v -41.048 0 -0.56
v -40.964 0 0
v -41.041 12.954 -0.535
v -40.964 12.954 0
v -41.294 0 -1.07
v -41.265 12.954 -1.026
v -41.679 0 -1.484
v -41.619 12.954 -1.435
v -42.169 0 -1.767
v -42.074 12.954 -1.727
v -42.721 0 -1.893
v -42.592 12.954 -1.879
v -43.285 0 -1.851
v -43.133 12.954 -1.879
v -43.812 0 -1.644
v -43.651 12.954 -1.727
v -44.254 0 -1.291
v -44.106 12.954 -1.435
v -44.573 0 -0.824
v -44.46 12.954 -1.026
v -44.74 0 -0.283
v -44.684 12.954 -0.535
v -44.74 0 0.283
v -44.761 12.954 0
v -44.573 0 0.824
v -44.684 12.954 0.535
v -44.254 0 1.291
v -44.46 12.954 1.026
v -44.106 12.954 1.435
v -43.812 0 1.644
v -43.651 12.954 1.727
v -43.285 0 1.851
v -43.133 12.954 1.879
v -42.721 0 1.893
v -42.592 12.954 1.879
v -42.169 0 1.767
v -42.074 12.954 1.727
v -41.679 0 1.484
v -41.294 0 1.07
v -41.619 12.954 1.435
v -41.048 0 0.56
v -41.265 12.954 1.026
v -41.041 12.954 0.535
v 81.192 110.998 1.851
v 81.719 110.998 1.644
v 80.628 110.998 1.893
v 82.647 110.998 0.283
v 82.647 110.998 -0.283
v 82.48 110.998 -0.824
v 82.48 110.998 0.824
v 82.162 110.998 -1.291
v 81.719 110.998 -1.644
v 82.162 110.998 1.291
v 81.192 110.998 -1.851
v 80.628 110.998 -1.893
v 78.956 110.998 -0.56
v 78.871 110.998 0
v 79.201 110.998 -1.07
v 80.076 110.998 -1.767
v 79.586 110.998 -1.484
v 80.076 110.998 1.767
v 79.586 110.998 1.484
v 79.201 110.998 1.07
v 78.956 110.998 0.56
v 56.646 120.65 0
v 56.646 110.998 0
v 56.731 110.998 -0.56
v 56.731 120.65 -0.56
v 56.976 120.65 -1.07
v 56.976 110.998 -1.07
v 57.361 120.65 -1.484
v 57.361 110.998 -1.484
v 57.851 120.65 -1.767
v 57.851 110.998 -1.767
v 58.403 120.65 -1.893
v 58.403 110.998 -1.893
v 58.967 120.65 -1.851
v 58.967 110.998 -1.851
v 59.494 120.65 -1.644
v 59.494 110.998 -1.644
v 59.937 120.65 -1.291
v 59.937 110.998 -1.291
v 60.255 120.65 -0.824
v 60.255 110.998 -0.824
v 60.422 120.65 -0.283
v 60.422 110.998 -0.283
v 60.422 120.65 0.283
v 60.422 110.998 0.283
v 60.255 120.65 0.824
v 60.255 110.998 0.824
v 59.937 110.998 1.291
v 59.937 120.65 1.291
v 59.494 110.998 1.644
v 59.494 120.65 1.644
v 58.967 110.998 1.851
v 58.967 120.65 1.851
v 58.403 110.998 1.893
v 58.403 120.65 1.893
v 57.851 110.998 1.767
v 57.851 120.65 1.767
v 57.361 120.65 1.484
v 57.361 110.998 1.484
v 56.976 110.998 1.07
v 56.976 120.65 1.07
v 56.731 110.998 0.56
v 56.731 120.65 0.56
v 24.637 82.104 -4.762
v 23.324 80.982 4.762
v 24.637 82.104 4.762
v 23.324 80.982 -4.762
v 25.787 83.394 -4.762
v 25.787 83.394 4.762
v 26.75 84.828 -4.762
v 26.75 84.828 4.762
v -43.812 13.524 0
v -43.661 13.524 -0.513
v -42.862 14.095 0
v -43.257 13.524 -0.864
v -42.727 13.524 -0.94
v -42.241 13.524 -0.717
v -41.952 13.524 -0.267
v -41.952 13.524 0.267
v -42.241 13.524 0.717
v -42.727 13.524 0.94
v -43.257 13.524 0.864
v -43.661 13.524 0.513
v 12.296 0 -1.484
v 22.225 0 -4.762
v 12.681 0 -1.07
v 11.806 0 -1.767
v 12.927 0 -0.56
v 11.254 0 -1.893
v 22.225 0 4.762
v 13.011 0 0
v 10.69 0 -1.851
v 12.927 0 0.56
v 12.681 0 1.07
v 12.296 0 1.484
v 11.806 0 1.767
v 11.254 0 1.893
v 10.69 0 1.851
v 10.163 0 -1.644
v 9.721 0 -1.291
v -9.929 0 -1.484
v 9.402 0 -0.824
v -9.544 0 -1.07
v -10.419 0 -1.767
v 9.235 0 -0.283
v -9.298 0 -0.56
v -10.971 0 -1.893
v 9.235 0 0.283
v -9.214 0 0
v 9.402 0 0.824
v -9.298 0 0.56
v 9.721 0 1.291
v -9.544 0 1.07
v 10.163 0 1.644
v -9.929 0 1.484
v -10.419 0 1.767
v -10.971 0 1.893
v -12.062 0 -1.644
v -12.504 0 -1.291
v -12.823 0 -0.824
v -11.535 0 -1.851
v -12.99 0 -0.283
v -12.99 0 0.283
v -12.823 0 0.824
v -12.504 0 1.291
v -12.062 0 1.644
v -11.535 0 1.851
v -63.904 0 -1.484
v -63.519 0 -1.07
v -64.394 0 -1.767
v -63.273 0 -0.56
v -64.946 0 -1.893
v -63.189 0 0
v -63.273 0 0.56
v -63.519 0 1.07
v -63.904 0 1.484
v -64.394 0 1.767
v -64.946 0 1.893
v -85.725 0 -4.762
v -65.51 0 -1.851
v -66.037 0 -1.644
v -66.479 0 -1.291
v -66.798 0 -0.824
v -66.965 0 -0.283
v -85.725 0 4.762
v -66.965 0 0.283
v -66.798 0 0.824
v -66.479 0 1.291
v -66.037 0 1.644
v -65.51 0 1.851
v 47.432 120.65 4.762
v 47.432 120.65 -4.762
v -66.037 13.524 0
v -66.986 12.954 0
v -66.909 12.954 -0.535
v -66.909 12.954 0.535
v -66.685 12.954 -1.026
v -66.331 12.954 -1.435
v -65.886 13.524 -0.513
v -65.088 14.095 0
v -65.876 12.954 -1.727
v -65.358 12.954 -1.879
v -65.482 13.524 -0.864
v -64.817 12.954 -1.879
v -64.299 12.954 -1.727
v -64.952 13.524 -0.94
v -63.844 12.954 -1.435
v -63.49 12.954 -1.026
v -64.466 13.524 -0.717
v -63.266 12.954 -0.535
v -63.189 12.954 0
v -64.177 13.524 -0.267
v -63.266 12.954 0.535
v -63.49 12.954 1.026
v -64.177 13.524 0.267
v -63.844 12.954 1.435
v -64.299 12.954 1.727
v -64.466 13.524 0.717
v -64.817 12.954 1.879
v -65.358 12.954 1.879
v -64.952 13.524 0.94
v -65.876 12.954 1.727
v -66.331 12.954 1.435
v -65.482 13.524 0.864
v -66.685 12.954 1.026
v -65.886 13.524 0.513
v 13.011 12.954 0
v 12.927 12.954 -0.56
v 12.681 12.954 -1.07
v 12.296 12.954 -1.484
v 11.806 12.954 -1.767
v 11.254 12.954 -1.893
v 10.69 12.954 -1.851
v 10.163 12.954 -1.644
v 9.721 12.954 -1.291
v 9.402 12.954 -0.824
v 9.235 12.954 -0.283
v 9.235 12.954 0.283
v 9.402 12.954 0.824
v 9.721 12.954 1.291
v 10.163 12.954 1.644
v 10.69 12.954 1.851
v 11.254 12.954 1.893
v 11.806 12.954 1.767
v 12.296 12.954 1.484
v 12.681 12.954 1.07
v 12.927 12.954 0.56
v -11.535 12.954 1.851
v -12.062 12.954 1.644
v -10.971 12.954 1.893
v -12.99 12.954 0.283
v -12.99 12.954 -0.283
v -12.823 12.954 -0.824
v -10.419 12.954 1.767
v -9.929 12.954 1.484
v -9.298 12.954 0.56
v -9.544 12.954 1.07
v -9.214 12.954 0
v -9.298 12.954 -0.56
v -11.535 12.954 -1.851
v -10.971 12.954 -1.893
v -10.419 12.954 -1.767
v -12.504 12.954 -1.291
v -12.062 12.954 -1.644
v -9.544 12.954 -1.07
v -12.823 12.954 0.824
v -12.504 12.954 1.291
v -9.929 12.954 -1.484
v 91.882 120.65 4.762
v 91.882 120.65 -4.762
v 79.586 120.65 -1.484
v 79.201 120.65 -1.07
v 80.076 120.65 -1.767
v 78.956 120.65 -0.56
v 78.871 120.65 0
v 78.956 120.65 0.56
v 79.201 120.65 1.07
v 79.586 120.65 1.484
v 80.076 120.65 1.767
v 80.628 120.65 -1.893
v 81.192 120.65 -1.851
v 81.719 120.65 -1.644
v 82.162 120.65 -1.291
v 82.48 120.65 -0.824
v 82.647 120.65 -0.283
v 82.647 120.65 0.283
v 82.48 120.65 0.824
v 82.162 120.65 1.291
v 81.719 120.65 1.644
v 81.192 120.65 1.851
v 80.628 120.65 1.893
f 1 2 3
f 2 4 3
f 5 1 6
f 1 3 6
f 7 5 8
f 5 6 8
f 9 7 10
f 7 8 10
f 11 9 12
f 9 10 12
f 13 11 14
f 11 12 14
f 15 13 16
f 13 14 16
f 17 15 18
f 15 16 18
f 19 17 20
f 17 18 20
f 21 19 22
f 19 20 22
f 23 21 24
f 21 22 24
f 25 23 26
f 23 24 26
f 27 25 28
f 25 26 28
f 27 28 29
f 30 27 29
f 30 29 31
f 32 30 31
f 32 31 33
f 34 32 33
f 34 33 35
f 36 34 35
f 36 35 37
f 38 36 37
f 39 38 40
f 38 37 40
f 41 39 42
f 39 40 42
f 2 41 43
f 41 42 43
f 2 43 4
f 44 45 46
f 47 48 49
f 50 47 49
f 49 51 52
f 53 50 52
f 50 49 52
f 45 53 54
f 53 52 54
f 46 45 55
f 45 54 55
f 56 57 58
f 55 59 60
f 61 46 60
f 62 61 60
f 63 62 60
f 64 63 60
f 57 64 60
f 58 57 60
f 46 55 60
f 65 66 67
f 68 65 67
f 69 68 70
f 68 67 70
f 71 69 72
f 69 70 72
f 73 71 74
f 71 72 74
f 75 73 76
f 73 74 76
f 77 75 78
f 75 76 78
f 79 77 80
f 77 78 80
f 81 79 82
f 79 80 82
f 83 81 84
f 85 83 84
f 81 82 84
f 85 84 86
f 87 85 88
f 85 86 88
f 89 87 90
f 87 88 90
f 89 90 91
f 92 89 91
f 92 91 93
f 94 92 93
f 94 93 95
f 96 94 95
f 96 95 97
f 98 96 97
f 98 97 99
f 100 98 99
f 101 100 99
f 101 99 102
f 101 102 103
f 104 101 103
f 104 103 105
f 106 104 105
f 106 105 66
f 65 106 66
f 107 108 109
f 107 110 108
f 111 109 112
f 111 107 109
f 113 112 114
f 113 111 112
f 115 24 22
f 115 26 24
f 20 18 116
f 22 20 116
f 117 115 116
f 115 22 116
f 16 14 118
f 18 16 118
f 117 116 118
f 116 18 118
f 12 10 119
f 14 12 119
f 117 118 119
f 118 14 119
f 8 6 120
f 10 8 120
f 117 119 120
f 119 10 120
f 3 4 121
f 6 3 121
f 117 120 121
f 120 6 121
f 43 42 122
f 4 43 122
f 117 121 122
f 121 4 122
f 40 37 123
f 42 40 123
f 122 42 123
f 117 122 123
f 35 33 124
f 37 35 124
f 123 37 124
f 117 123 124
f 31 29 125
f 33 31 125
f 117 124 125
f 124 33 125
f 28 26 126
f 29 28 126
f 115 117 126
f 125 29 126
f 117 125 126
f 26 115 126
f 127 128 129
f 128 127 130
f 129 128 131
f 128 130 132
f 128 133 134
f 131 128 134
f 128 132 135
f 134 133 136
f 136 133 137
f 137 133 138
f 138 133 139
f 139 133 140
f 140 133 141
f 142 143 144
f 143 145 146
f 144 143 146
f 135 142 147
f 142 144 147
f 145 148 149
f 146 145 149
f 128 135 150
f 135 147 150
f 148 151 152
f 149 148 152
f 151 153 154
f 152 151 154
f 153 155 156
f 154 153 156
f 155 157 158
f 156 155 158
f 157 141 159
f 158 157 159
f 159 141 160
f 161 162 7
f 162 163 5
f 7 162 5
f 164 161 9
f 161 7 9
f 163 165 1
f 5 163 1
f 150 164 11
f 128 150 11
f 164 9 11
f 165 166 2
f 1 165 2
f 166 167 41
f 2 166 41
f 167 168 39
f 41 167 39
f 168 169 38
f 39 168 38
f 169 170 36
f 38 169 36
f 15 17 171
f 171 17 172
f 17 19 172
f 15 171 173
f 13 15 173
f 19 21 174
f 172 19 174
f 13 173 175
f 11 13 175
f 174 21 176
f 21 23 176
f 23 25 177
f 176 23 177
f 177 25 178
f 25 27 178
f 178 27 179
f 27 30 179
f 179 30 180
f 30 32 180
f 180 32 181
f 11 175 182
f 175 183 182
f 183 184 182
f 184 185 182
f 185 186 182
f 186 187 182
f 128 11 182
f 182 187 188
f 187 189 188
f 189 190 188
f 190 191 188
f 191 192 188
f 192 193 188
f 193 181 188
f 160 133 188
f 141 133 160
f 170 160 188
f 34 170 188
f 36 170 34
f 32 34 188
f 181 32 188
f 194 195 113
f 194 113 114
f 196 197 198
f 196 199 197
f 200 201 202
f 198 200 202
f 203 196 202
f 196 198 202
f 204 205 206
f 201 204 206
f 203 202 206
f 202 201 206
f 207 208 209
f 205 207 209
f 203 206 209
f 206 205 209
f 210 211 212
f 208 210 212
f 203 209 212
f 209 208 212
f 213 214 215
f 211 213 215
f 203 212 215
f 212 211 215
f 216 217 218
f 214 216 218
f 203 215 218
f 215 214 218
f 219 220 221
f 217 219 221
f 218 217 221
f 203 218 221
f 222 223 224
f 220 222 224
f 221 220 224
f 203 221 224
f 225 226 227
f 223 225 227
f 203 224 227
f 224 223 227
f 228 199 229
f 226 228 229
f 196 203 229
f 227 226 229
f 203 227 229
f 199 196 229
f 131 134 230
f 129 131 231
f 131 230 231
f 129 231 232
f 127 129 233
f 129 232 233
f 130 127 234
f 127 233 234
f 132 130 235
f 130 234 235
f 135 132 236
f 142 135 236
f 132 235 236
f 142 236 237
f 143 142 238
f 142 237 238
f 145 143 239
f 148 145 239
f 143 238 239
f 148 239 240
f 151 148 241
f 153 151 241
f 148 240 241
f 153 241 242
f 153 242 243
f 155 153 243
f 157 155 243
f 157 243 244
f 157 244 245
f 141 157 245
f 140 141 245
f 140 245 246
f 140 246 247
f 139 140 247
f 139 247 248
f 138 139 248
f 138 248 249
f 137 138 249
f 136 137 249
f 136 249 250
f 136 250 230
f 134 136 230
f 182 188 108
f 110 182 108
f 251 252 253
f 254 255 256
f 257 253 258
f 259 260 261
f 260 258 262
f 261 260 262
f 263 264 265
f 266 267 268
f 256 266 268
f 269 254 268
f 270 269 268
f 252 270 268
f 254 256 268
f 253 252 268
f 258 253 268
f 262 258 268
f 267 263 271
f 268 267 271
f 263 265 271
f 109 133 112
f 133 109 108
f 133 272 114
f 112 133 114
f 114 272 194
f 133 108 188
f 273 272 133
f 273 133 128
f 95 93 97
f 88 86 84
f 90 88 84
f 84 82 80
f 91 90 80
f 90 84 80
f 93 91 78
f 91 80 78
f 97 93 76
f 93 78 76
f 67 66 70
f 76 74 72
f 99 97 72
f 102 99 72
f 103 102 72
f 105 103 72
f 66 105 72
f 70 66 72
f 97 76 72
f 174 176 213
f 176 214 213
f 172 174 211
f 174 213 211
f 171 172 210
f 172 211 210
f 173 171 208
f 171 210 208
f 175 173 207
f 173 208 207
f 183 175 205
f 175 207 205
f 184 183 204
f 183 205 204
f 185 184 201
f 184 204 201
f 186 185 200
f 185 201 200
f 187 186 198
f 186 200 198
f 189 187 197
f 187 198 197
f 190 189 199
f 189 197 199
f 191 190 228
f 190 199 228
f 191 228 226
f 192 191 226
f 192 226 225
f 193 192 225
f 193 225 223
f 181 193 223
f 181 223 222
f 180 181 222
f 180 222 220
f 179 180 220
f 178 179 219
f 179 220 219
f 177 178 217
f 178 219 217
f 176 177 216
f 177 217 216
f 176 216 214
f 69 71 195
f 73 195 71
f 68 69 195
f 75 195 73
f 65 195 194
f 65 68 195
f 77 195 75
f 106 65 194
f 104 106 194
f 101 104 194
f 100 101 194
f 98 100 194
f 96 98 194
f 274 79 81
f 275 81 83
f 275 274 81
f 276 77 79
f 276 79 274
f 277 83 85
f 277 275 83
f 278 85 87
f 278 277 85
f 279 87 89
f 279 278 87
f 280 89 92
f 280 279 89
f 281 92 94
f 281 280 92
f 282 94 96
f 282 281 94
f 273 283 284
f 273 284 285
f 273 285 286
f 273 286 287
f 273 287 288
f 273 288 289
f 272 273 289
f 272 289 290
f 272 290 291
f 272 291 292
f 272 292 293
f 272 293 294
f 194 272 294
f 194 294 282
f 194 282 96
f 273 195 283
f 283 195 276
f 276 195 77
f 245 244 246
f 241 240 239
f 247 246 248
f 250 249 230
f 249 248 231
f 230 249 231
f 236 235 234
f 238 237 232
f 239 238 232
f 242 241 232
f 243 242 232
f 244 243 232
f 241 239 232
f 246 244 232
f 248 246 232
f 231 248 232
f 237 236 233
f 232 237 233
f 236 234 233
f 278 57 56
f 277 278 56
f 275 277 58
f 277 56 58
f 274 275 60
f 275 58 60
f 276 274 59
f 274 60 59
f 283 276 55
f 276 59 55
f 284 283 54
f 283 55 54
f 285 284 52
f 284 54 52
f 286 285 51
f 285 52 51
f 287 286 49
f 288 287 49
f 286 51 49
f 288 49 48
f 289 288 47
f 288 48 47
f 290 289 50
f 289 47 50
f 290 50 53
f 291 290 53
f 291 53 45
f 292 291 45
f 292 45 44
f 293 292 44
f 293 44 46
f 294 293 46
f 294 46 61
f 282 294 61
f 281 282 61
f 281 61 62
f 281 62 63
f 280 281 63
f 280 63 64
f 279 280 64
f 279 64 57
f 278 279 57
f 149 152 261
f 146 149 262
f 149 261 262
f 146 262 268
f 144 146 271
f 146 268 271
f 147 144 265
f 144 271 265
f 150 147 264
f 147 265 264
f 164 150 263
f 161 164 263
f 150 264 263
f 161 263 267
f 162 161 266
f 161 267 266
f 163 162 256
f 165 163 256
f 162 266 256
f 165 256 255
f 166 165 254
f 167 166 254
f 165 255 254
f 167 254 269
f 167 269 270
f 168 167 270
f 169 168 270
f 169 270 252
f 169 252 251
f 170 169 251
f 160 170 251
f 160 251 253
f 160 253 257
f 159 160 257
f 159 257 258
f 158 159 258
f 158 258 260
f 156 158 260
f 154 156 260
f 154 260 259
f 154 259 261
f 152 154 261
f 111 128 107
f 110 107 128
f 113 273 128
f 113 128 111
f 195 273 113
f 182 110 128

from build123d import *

# Parameters (mm, degrees)
SKETCH1_W                  = 44.45
SKETCH1_H                  = 9.525
F_10_24_TAPPED_HOLE1_D     = 3.7973
F_10_24_TAPPED_HOLE1_DEPTH = 12.954
F_10_24_TAPPED_HOLE2_D     = 3.7973
F_10_24_TAPPED_HOLE2_DEPTH = 9.652
BOSS_EXTRUDE1_DEPTH        = 9.525
F_10_24_TAPPED_HOLE3_D     = 3.7973
F_10_24_TAPPED_HOLE3_DEPTH = 12.954
F_10_24_TAPPED_HOLE3_TIP   = 1.140824014
FILLET1_R                  = 12.7


with BuildPart() as part:
    # Sweep1: sweep along a path in Sketch2
    with BuildLine(Plane.XY) as sweep1_path:
        Line((-22.225, 0), (47.432309978, 120.65))
    # Sketch1 → Sweep1 (sweep)
    with BuildSketch(Plane(origin=(0, 0, 0), x_dir=(1, 0, 0), z_dir=(0, 1, 0))):
        Rectangle(SKETCH1_W, SKETCH1_H)
    sweep(path=sweep1_path.line)

    # #10-24 Tapped Hole1
    with Locations(Plane(origin=(0, 0, 0), x_dir=(-1, 0, 0), z_dir=(0, -1, 0))):
        with Locations((11.1125, 0), (-11.1125, 0)):
            Hole(F_10_24_TAPPED_HOLE1_D / 2, depth=F_10_24_TAPPED_HOLE1_DEPTH)

    # #10-24 Tapped Hole2
    with Locations(Plane(origin=(0, 120.65, 0), x_dir=(1, 0, 0), z_dir=(0, 1, 0))):
        with Locations((58.544809978, 0), (80.769809978, 0)):
            Hole(F_10_24_TAPPED_HOLE2_D / 2, depth=F_10_24_TAPPED_HOLE2_DEPTH)

    # Sketch14 → Boss-Extrude1 (add)
    with BuildSketch(Plane.XY.offset(4.7625)):
        Polygon((-22.225, 0), (-85.725, 0), (25.435264722, 82.55), align=None)
    extrude(amount=-BOSS_EXTRUDE1_DEPTH)

    # #10-24 Tapped Hole3
    with Locations(Plane(origin=(0, 0, 0), x_dir=(-1, 0, 0), z_dir=(0, -1, 0))):
        with Locations((42.8625, 0), (65.0875, 0)):
            Hole(F_10_24_TAPPED_HOLE3_D / 2, depth=F_10_24_TAPPED_HOLE3_DEPTH)
            with Locations((0, 0, -(F_10_24_TAPPED_HOLE3_DEPTH + F_10_24_TAPPED_HOLE3_TIP / 2))):  # 118° drill point
                Cone(0, F_10_24_TAPPED_HOLE3_D / 2, F_10_24_TAPPED_HOLE3_TIP, mode=Mode.SUBTRACT)

    # Fillet1
    fillet1_edges = [part.edges().sort_by_distance(p)[0] for p in [
        (25.435264722, 82.55, 0),
    ]]
    fillet(fillet1_edges, radius=FILLET1_R)


solid = part.part
